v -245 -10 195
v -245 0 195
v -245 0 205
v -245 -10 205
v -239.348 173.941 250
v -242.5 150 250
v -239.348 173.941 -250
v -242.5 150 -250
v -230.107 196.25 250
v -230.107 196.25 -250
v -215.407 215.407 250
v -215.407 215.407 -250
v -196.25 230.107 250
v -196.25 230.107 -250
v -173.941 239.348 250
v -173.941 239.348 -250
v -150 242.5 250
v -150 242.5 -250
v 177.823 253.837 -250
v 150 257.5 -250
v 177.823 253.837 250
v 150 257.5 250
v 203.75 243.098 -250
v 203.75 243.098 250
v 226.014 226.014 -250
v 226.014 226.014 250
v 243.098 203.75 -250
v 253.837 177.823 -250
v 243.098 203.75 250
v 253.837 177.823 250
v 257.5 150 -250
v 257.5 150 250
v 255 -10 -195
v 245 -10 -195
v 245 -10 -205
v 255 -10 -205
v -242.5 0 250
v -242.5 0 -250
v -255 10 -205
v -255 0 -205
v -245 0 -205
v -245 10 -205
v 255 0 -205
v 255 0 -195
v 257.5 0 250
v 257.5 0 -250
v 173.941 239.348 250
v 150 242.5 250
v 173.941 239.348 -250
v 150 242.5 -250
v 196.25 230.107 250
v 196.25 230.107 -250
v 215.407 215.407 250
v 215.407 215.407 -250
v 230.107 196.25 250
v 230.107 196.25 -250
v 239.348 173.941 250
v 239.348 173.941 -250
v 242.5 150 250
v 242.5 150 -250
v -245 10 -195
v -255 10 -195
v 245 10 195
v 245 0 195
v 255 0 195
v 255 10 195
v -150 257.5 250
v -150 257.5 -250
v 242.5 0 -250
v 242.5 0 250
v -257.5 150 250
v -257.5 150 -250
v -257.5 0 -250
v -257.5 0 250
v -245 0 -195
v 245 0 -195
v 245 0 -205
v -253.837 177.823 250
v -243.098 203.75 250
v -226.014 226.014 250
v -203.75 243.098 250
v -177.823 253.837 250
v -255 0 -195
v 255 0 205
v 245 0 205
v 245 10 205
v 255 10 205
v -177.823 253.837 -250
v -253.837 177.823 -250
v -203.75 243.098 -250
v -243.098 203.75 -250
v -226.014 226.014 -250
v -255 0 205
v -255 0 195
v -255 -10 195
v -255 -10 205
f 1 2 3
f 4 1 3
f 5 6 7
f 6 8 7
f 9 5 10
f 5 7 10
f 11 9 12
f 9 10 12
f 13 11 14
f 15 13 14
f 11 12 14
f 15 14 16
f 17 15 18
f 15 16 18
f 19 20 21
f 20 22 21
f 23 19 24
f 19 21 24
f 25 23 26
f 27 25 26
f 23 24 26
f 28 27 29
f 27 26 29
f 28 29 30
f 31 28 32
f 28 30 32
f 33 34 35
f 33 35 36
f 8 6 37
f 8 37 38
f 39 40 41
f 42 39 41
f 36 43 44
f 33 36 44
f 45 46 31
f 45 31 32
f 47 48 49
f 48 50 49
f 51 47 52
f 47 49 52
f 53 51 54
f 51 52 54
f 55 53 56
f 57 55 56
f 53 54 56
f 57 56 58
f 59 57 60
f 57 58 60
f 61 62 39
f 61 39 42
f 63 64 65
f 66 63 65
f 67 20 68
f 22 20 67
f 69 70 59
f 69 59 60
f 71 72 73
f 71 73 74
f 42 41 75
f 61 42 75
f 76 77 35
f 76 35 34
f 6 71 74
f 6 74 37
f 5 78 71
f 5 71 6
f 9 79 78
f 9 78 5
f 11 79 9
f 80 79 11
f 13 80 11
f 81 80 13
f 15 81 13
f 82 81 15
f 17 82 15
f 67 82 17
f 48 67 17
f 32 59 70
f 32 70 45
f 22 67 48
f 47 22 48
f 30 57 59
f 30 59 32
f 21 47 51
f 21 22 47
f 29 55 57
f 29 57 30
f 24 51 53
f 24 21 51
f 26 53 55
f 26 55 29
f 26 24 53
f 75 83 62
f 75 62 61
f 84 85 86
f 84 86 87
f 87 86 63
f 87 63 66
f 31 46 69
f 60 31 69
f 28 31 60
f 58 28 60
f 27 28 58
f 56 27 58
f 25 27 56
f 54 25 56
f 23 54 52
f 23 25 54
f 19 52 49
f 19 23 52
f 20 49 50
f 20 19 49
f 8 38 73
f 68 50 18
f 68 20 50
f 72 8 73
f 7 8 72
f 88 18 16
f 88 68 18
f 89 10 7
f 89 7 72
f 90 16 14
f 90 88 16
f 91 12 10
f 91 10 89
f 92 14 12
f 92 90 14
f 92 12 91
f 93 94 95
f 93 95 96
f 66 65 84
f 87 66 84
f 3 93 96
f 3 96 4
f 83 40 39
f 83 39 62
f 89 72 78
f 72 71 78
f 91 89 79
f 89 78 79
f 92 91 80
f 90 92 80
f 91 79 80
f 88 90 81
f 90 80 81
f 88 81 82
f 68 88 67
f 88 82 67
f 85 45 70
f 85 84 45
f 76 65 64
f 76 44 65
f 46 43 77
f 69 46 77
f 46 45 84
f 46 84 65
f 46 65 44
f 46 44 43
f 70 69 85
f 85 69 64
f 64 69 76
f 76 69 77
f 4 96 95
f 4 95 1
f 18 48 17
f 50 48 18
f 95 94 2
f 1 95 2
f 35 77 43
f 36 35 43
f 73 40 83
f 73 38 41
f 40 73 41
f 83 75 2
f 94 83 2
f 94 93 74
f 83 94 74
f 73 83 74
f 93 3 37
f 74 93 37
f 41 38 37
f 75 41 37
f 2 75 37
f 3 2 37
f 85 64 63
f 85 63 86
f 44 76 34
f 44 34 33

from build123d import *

# Parameters (mm, degrees)
SKETCH2_W           = 15
SKETCH2_H           = 500
SKETCH3_W           = 10
SKETCH3_H           = 10
BOSS_EXTRUDE1_DEPTH = 10
SKETCH3_3_W         = 10
SKETCH3_3_H         = 10
CUT_EXTRUDE1_DEPTH  = 10


with BuildPart() as part:
    # Sweep1: sweep along a path in Sketch1
    with BuildLine(Plane.XY) as sweep1_path:
        Line((-250, 0), (-250, 150))
        ThreePointArc((-250, 150), (-220.710678119, 220.710678119), (-150, 250))
        Line((-150, 250), (150, 250))
        ThreePointArc((150, 250), (220.710678119, 220.710678119), (250, 150))
        Line((250, 150), (250, 0))
    # Sketch2 → Sweep1 (sweep)
    with BuildSketch(Plane(origin=(0, 0, 0), x_dir=(1, 0, 0), z_dir=(0, 1, 0))):
        with Locations((-250, 0)):
            Rectangle(SKETCH2_W, SKETCH2_H)
    sweep(path=sweep1_path.line)

    # Sketch3 → Boss-Extrude1 (add)
    with BuildSketch(Plane.XZ):
        with Locations((-250, 200)):
            Rectangle(SKETCH3_W, SKETCH3_H)
        with Locations((250, -200)):
            Rectangle(SKETCH3_W, SKETCH3_H)
    extrude(amount=BOSS_EXTRUDE1_DEPTH)

    # Sketch3<3> → Cut-Extrude1 (cut)
    with BuildSketch(Plane.XZ):
        with Locations((-250, -200)):
            Rectangle(SKETCH3_3_W, SKETCH3_3_H)
        with Locations((250, 200)):
            Rectangle(SKETCH3_3_W, SKETCH3_3_H)
    extrude(amount=-CUT_EXTRUDE1_DEPTH, mode=Mode.SUBTRACT)


solid = part.part
